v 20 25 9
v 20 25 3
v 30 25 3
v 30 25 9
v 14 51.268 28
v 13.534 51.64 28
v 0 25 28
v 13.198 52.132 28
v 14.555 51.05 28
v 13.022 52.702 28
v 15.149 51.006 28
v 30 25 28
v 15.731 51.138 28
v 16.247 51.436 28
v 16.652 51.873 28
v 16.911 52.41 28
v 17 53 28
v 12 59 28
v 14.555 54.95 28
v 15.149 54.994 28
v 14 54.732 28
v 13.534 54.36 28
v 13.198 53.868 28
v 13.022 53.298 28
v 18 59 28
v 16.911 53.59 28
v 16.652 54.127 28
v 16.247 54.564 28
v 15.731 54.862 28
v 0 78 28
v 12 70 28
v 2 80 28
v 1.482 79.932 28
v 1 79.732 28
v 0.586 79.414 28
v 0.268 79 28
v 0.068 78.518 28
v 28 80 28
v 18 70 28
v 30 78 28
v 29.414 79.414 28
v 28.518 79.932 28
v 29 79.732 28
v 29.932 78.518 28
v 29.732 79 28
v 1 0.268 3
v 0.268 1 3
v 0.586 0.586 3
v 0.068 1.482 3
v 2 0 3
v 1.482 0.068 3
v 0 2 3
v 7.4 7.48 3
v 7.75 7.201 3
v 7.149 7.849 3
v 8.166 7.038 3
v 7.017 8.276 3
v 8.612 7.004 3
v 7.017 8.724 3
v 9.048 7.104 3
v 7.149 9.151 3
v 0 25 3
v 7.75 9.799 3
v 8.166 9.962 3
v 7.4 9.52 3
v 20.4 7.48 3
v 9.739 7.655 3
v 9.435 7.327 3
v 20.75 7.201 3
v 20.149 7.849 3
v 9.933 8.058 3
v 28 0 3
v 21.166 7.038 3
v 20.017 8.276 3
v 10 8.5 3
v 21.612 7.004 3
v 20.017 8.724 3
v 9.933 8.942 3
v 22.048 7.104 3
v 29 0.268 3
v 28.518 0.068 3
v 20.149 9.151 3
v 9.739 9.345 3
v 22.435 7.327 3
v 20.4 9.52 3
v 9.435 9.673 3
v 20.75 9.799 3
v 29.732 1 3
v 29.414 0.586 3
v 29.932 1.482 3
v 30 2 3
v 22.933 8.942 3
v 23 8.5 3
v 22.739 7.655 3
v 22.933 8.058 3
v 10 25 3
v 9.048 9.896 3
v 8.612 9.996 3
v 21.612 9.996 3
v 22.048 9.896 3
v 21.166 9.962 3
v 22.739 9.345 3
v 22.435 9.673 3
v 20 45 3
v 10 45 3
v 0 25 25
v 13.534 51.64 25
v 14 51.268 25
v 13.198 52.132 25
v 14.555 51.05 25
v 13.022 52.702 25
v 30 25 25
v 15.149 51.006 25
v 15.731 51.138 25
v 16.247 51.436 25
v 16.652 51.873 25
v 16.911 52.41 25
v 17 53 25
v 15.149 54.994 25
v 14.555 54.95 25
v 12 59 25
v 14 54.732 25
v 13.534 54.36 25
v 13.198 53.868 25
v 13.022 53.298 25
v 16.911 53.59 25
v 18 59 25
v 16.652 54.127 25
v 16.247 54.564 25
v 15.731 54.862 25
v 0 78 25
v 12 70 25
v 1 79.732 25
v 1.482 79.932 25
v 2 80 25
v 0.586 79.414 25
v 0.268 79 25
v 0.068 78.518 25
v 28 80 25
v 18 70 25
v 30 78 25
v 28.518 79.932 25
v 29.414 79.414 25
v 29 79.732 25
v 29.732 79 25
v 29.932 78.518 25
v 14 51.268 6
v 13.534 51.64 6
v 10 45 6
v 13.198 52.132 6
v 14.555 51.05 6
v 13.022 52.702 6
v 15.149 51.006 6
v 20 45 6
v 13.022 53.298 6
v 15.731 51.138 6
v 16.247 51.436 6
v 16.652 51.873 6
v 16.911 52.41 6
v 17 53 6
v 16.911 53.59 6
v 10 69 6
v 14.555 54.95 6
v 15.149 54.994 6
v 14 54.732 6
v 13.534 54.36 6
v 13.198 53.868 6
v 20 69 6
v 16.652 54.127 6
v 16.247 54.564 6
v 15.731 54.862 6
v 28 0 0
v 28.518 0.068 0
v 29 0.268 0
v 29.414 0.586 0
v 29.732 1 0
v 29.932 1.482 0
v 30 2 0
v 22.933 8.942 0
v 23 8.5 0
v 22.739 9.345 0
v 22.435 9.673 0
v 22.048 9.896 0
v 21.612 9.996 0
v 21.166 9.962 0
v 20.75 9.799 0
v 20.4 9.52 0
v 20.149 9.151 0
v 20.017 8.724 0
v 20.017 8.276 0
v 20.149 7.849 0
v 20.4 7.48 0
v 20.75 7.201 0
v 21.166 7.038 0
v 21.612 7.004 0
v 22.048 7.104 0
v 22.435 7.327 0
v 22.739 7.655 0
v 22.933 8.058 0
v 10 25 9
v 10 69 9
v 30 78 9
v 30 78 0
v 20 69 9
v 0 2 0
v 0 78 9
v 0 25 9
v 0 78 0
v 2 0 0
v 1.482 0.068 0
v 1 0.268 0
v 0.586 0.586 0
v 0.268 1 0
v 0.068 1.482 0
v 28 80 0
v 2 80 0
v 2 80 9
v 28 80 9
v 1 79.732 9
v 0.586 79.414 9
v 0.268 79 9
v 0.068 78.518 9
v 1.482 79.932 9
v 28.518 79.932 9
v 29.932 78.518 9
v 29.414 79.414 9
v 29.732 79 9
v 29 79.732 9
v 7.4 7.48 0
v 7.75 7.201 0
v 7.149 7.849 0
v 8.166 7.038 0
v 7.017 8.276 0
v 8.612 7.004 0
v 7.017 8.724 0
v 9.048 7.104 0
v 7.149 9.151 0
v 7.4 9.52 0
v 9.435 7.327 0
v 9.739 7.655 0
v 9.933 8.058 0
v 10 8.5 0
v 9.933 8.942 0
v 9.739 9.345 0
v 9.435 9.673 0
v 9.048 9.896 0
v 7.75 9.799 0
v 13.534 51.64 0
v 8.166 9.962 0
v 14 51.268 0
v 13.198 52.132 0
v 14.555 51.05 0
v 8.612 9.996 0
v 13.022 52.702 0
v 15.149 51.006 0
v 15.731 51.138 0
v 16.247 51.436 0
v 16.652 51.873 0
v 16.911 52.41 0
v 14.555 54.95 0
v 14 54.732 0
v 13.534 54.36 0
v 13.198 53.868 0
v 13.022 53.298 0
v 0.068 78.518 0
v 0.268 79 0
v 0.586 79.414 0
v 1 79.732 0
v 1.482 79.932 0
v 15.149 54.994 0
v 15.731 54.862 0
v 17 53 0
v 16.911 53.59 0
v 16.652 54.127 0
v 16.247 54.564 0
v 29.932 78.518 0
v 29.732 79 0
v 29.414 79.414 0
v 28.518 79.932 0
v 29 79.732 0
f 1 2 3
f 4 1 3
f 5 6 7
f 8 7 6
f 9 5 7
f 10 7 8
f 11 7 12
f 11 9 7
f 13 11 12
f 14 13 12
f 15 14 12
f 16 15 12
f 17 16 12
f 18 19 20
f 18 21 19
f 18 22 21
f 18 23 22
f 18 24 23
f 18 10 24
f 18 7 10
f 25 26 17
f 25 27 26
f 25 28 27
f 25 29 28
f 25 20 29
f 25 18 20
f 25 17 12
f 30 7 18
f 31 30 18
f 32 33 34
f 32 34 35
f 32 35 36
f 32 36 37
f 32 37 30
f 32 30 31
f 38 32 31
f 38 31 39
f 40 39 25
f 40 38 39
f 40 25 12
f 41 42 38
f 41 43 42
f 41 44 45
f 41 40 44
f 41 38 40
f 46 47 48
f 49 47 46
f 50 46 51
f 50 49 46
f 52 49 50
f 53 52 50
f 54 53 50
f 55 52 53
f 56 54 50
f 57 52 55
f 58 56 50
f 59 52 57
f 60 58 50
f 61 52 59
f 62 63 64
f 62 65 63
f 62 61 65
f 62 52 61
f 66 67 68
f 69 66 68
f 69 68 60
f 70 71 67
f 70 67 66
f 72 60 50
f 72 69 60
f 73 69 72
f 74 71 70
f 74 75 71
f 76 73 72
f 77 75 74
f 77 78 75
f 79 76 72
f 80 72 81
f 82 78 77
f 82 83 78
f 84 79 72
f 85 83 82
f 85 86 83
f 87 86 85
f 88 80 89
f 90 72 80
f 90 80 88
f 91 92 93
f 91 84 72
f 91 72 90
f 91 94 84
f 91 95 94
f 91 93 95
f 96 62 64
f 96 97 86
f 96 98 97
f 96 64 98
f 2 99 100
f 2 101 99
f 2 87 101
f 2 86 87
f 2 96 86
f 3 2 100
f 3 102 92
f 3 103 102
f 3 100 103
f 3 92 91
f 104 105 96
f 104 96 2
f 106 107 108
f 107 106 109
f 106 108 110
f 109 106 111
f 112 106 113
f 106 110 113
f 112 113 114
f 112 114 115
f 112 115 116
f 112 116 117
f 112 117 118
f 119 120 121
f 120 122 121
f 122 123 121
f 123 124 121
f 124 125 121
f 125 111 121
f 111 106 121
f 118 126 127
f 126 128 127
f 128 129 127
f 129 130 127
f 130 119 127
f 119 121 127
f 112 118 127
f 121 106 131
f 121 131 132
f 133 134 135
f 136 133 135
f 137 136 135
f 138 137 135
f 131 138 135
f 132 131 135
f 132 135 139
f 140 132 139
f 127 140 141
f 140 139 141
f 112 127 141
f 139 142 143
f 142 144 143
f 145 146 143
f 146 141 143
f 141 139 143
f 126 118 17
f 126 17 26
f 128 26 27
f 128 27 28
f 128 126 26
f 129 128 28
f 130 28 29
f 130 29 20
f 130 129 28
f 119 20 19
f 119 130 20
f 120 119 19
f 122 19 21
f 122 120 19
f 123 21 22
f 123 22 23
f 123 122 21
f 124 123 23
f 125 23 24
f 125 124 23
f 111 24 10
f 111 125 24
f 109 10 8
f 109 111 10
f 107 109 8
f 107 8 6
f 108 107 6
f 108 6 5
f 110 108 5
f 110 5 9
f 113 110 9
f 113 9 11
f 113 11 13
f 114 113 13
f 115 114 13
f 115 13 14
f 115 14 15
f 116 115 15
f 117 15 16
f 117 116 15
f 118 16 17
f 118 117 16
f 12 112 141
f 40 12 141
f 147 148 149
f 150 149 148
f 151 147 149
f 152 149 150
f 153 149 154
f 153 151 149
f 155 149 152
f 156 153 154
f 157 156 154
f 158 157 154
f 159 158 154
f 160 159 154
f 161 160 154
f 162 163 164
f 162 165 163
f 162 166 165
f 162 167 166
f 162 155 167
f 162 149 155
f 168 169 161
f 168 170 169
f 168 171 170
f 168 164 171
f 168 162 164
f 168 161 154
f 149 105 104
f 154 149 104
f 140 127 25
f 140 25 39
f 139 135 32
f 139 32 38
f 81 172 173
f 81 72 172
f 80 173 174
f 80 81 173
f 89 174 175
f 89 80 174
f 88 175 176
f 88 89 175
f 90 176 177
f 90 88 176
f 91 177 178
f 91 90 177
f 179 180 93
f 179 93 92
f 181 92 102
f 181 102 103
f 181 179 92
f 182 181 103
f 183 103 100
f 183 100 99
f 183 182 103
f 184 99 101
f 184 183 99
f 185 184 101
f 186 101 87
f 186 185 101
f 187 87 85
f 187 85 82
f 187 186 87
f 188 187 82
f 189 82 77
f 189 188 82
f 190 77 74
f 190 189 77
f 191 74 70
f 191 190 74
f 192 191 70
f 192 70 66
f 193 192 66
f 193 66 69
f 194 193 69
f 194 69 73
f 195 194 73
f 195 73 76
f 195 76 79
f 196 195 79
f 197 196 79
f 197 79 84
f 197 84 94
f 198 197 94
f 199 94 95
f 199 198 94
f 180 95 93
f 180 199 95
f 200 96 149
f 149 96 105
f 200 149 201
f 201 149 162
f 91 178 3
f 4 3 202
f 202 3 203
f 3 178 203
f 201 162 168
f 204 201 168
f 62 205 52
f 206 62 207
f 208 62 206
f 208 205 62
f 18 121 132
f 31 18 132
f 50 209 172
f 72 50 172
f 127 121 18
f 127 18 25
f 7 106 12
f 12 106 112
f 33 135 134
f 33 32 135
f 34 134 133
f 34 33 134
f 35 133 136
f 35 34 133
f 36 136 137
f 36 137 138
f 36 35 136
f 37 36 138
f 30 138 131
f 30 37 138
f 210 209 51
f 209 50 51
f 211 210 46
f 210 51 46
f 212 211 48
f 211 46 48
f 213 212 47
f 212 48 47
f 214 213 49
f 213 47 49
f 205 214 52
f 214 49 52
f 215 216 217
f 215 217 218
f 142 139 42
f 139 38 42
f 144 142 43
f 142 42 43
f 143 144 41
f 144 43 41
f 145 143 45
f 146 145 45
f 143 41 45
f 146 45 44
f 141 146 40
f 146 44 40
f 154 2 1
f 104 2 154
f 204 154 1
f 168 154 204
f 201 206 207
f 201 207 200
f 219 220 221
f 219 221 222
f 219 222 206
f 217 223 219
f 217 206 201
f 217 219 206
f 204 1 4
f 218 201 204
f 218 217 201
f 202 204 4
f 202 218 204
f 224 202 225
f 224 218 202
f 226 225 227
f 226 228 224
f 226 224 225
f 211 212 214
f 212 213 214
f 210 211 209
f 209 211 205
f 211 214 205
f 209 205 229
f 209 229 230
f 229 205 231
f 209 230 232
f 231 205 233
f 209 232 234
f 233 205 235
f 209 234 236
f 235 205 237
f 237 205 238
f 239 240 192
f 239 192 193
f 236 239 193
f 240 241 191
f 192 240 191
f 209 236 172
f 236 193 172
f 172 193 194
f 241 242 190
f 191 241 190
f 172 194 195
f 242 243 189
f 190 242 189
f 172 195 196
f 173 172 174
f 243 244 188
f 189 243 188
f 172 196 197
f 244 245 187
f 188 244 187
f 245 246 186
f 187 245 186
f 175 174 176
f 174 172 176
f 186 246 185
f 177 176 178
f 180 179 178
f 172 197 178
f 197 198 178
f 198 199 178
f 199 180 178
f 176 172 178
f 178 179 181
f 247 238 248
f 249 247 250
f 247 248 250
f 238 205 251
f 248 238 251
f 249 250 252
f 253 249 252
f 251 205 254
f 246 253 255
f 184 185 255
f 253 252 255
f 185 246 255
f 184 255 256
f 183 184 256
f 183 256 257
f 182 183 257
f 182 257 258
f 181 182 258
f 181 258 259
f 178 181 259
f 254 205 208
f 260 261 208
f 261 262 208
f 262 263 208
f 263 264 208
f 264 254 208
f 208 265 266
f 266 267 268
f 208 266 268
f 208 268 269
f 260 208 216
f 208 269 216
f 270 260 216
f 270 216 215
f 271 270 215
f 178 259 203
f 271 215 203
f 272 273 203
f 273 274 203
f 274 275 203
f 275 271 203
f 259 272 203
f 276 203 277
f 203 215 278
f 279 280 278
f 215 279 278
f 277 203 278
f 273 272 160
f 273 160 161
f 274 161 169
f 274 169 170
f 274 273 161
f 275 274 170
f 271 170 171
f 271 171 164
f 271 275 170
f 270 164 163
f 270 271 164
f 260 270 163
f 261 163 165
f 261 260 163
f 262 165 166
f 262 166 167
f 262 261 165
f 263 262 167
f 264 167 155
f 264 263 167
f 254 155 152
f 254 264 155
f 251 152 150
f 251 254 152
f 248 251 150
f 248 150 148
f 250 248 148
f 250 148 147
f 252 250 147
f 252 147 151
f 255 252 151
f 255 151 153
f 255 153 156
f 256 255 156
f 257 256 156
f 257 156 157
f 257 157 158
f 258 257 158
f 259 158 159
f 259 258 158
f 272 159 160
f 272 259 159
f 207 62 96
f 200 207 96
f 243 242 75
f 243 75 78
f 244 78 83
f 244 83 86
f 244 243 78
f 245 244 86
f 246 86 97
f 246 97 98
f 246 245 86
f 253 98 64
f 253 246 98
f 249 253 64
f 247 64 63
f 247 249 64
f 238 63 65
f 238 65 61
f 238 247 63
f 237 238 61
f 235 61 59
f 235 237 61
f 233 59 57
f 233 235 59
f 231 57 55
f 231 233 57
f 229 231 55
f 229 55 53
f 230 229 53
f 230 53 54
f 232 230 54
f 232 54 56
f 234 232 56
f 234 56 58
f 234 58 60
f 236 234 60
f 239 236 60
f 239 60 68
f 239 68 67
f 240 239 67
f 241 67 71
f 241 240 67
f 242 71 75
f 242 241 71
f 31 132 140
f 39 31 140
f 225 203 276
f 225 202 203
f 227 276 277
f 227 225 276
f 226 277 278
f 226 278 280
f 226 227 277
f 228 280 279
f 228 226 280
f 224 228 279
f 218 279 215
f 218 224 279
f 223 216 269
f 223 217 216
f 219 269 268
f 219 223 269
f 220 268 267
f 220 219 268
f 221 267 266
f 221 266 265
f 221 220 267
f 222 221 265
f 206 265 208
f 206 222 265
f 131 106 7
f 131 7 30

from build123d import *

# Parameters (mm, degrees)
CYLINDER001_R     = 1.5
CYLINDER001_DEPTH = 3
CYLINDER002_R     = 1.5
CYLINDER002_DEPTH = 3
CYLINDER_R        = 2
CYLINDER_DEPTH    = 6
BOX003_W          = 30
BOX003_H          = 25
BOX003_DEPTH      = 6
BOX002_W          = 10
BOX002_H          = 20
BOX002_DEPTH      = 3
BOX001_W          = 10
BOX001_H          = 44
BOX001_DEPTH      = 3
BOX_W             = 30
BOX_H             = 80
BOX_DEPTH         = 9
FILLET_R          = 2
FILLET001_R       = 2
FILLET002_R       = 2
FILLET003_R       = 2
CYLINDER003_R     = 2
CYLINDER003_DEPTH = 3
BOX004_W          = 6
BOX004_H          = 11
BOX004_DEPTH      = 3
BOX005_W          = 30
BOX005_H          = 55
BOX005_DEPTH      = 3
FILLET004_R       = 2
FILLET005_R       = 2


with BuildPart() as cilindro001:
    # Cylinder001 → Cylinder001 (new body)
    with BuildSketch(Plane(origin=(8.5, 8.5, 0), x_dir=(1, 0, 0), z_dir=(0, 0, 1))):
        Circle(CYLINDER001_R)
    extrude(amount=CYLINDER001_DEPTH)


with BuildPart() as fusion:
    # Cylinder002 → Cylinder002 (new body)
    with BuildSketch(Plane(origin=(21.5, 8.5, 0), x_dir=(1, 0, 0), z_dir=(0, 0, 1))):
        Circle(CYLINDER002_R)
    extrude(amount=CYLINDER002_DEPTH)

    # Fusion: union Cilindro001
    add(cilindro001.part)


with BuildPart() as cilindro:
    # Cylinder → Cylinder (new body)
    with BuildSketch(Plane(origin=(15, 53, 0), x_dir=(1, 0, 0), z_dir=(0, 0, 1))):
        Circle(CYLINDER_R)
    extrude(amount=CYLINDER_DEPTH)


with BuildPart() as cubo003:
    # Box003 → Box003 (new body)
    with BuildSketch(Plane.XY.offset(3)):
        with Locations((15, 12.5)):
            Rectangle(BOX003_W, BOX003_H)
    extrude(amount=BOX003_DEPTH)


with BuildPart() as cubo002:
    # Box002 → Box002 (new body)
    with BuildSketch(Plane(origin=(10, 25, 3), x_dir=(1, 0, 0), z_dir=(0, 0, 1))):
        with Locations((5, 10)):
            Rectangle(BOX002_W, BOX002_H)
    extrude(amount=BOX002_DEPTH)


with BuildPart() as cubo001:
    # Box001 → Box001 (new body)
    with BuildSketch(Plane(origin=(10, 25, 6), x_dir=(1, 0, 0), z_dir=(0, 0, 1))):
        with Locations((5, 22)):
            Rectangle(BOX001_W, BOX001_H)
    extrude(amount=BOX001_DEPTH)


with BuildPart() as fillet003:
    # Box → Box (new body)
    with BuildSketch(Plane.XY):
        with Locations((15, 40)):
            Rectangle(BOX_W, BOX_H)
    extrude(amount=BOX_DEPTH)

    # Cut: cut Cubo001
    add(cubo001.part, mode=Mode.SUBTRACT)

    # Cut001: cut Cubo002
    add(cubo002.part, mode=Mode.SUBTRACT)

    # Cut002: cut Cubo003
    add(cubo003.part, mode=Mode.SUBTRACT)

    # Cut003: cut Cilindro
    add(cilindro.part, mode=Mode.SUBTRACT)

    # Cut004: cut Fusion
    add(fusion.part, mode=Mode.SUBTRACT)

    # Fillet
    fillet_edges = [fillet003.edges().sort_by_distance(p)[0] for p in [
        (30, 0, 1.5),
    ]]
    fillet(fillet_edges, radius=FILLET_R)

    # Fillet001
    fillet001_edges = [fillet003.edges().sort_by_distance(p)[0] for p in [
        (0, 0, 1.5),
    ]]
    fillet(fillet001_edges, radius=FILLET001_R)

    # Fillet002
    fillet002_edges = [fillet003.edges().sort_by_distance(p)[0] for p in [
        (30, 80, 4.5),
    ]]
    fillet(fillet002_edges, radius=FILLET002_R)

    # Fillet003
    fillet003_edges = [fillet003.edges().sort_by_distance(p)[0] for p in [
        (0, 80, 4.5),
    ]]
    fillet(fillet003_edges, radius=FILLET003_R)


with BuildPart() as cilindro003:
    # Cylinder003 → Cylinder003 (new body)
    with BuildSketch(Plane(origin=(15, 53, 25), x_dir=(1, 0, 0), z_dir=(0, 0, 1))):
        Circle(CYLINDER003_R)
    extrude(amount=CYLINDER003_DEPTH)


with BuildPart() as cubo004:
    # Box004 → Box004 (new body)
    with BuildSketch(Plane(origin=(12, 59, 25), x_dir=(1, 0, 0), z_dir=(0, 0, 1))):
        with Locations((3, 5.5)):
            Rectangle(BOX004_W, BOX004_H)
    extrude(amount=BOX004_DEPTH)


with BuildPart() as fillet005:
    # Box005 → Box005 (new body)
    with BuildSketch(Plane(origin=(0, 25, 25), x_dir=(1, 0, 0), z_dir=(0, 0, 1))):
        with Locations((15, 27.5)):
            Rectangle(BOX005_W, BOX005_H)
    extrude(amount=BOX005_DEPTH)

    # Cut005: cut Cubo004
    add(cubo004.part, mode=Mode.SUBTRACT)

    # Cut006: cut Cilindro003
    add(cilindro003.part, mode=Mode.SUBTRACT)

    # Fillet004
    fillet004_edges = [fillet005.edges().sort_by_distance(p)[0] for p in [
        (30, 80, 26.5),
    ]]
    fillet(fillet004_edges, radius=FILLET004_R)

    # Fillet005
    fillet005_edges = [fillet005.edges().sort_by_distance(p)[0] for p in [
        (0, 80, 26.5),
    ]]
    fillet(fillet005_edges, radius=FILLET005_R)


solid = Compound([fillet003.part, fillet005.part])
